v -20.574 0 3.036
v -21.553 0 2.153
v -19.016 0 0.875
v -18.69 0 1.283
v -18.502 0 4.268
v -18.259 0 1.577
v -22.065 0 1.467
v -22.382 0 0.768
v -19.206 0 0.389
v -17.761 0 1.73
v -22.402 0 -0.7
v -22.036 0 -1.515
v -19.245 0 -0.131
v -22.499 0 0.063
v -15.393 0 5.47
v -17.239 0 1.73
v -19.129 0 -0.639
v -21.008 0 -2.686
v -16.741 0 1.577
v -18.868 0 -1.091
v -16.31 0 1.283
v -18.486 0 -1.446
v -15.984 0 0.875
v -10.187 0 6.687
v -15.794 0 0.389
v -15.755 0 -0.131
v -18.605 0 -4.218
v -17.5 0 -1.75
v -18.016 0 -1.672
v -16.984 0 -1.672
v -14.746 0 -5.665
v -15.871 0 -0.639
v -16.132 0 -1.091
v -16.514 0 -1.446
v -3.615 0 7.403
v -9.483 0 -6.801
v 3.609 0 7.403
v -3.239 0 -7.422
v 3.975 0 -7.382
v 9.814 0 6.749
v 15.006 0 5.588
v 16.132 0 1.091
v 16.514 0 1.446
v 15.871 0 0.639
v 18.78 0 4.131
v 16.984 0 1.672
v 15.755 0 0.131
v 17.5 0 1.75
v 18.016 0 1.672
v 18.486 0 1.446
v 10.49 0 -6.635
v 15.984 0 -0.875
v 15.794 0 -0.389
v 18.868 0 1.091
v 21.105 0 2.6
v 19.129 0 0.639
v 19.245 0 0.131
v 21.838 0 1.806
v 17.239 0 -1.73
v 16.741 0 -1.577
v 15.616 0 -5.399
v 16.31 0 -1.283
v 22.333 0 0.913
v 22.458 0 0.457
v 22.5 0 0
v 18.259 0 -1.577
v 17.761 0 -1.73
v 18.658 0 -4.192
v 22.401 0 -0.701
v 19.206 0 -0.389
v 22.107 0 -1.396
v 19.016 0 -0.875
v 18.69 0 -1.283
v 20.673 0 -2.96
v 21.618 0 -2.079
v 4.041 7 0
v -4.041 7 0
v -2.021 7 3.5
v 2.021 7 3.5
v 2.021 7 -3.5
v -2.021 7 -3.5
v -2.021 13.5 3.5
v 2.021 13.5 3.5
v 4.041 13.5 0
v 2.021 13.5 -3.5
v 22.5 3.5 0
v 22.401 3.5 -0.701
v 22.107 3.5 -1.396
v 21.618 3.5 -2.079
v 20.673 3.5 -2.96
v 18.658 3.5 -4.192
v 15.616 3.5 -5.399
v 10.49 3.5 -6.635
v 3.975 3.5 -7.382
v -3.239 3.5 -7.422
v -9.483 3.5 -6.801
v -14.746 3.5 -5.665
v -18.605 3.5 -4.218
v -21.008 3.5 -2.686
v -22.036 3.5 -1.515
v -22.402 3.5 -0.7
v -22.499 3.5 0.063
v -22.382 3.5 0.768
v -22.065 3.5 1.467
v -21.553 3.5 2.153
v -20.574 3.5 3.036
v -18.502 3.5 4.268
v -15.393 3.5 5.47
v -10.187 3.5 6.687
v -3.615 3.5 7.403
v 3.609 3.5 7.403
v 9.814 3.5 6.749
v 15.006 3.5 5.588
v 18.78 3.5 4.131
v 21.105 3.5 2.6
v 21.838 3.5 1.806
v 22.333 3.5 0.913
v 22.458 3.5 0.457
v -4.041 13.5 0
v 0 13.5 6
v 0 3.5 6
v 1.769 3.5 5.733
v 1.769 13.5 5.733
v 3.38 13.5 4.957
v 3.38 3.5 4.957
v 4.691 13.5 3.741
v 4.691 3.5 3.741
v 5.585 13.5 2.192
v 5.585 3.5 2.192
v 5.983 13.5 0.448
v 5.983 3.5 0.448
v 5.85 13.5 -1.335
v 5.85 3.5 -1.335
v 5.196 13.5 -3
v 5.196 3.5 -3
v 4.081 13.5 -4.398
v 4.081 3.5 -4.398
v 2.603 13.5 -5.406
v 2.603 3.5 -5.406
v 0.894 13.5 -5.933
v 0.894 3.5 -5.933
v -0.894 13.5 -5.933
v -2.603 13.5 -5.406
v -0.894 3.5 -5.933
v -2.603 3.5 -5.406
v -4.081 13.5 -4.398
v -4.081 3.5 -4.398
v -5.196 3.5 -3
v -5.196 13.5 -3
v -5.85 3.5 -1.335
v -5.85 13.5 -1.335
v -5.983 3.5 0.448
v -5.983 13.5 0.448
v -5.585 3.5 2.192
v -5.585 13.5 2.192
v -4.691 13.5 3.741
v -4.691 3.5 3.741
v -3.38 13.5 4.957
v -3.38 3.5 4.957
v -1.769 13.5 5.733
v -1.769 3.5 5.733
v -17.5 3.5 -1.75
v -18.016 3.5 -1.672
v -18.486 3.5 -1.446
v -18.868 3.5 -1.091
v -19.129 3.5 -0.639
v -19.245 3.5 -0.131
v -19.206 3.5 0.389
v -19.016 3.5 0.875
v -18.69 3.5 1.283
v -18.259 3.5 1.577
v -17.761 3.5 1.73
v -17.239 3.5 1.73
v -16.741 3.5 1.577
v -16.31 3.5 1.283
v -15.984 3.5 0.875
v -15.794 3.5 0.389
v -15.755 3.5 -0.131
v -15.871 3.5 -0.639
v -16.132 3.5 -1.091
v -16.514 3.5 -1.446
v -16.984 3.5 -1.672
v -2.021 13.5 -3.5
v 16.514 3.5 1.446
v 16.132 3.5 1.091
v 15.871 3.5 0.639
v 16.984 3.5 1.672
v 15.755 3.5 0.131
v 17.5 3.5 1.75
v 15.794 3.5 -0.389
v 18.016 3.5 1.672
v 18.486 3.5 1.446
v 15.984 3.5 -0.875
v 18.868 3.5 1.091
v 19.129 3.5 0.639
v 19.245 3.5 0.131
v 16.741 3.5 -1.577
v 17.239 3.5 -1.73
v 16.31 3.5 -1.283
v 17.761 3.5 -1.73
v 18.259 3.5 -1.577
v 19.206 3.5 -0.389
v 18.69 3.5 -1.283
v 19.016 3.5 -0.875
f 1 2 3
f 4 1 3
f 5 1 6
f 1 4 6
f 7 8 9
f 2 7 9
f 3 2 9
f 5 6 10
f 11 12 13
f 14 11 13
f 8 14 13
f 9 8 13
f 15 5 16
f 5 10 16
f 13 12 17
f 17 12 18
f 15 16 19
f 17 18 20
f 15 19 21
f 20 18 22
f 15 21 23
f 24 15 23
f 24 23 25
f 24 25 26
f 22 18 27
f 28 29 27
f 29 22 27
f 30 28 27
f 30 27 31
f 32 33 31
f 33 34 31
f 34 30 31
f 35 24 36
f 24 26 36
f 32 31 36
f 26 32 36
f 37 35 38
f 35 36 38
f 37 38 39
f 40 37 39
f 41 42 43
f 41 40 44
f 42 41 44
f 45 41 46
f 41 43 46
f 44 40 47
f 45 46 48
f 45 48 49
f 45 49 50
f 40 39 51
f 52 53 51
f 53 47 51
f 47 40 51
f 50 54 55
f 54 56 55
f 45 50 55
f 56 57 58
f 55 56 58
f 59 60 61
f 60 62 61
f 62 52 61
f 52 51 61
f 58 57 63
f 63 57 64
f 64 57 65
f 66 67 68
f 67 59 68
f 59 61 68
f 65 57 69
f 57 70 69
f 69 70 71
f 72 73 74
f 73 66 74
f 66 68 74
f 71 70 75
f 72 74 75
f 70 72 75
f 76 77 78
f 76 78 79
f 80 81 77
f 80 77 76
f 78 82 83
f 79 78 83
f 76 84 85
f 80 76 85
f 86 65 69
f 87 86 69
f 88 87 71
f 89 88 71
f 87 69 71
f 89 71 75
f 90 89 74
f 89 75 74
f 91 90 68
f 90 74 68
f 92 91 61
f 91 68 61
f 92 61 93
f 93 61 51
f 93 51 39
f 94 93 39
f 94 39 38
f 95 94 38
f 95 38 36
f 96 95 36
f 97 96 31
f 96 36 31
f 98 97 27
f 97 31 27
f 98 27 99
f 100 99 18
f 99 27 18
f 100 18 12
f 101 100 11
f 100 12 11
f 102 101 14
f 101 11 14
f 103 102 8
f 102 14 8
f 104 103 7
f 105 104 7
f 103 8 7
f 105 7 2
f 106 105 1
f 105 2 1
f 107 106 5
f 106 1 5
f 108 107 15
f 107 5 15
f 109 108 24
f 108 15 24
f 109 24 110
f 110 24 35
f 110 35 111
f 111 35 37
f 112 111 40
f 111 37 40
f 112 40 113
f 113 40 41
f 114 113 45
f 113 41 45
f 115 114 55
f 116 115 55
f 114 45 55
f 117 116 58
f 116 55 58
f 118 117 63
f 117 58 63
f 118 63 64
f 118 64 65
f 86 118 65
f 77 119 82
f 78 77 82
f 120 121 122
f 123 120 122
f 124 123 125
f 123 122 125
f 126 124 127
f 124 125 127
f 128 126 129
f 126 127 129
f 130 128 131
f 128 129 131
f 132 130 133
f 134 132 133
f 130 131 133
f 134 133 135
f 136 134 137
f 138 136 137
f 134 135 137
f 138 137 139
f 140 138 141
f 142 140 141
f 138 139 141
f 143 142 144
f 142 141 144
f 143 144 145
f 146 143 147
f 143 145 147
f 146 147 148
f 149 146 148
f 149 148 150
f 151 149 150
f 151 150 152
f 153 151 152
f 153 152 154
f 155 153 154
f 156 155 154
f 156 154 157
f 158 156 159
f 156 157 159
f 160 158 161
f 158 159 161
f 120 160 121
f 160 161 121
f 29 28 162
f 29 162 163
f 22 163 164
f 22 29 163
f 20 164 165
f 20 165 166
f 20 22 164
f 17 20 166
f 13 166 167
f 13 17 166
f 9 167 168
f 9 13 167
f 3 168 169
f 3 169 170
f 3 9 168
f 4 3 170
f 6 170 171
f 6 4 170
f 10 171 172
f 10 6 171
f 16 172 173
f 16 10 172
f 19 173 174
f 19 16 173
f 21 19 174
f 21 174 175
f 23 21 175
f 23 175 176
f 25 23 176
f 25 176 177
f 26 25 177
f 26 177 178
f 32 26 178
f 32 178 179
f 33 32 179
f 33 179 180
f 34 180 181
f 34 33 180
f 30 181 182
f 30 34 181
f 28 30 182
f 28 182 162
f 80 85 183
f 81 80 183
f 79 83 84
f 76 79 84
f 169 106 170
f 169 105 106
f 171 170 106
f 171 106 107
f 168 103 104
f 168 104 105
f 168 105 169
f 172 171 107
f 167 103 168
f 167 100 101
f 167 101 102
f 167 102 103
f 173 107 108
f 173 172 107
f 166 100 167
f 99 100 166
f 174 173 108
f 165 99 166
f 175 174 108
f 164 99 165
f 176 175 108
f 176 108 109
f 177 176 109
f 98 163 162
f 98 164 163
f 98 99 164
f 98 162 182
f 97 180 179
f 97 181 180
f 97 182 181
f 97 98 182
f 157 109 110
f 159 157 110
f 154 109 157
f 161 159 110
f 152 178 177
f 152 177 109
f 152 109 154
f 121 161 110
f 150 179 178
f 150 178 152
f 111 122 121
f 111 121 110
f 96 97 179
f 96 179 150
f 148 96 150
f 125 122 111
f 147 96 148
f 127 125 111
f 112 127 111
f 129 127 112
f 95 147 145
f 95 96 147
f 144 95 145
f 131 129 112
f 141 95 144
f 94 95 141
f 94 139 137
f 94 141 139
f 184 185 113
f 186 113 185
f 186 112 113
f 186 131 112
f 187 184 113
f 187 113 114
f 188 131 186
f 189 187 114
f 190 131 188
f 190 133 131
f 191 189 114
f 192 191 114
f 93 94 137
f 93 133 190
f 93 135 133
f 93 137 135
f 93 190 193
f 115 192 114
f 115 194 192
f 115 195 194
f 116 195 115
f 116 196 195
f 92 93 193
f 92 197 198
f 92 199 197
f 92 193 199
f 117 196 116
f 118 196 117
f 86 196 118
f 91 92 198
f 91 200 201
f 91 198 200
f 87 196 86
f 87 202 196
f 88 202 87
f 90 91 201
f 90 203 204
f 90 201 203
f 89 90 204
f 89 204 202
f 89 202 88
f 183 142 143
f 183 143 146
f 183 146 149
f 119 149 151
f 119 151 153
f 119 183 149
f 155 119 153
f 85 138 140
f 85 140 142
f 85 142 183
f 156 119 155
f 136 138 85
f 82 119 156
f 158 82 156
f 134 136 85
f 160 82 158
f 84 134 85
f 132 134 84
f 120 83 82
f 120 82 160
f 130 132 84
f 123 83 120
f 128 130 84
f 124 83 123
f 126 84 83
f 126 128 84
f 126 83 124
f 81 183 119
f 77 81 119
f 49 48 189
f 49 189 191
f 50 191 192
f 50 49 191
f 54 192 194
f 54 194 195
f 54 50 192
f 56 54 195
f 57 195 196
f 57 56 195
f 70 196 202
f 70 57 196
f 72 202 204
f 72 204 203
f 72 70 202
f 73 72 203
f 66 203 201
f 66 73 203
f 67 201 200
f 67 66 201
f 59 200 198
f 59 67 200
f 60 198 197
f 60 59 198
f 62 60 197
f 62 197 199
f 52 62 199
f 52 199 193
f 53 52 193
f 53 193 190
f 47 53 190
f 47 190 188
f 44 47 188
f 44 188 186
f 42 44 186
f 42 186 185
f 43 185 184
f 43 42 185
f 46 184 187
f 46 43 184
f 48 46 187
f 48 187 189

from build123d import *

# Parameters (mm, degrees)
SKETCH2_RX          = 22.5
SKETCH2_RY          = 7.5
SKETCH2_R           = 1.75
BOSS_EXTRUDE3_DEPTH = 3.5
SKETCH3_R           = 6
BOSS_EXTRUDE4_DEPTH = 10
CUT_EXTRUDE1_DEPTH  = 6.5


with BuildPart() as part:
    # Sketch2 → Boss-Extrude3 (new body)
    with BuildSketch(Plane(origin=(0, 0, 0), x_dir=(1, 0, 0), z_dir=(0, 1, 0))):
        with Locations((0, 0)):
            Ellipse(SKETCH2_RX, SKETCH2_RY)
        with Locations(Location((17.5, 0, 0), (0, 0, 270))):
            Circle(SKETCH2_R, mode=Mode.SUBTRACT)
        with Locations(Location((-17.5, 0, 0), (0, 0, 90))):
            Circle(SKETCH2_R, mode=Mode.SUBTRACT)
    extrude(amount=BOSS_EXTRUDE3_DEPTH)

    # Sketch3 → Boss-Extrude4 (add)
    with BuildSketch(Plane(origin=(0, 3.5, 0), x_dir=(1, 0, 0), z_dir=(0, 1, 0))):
        with Locations(Location((0, 0, 0), (0, 0, 270))):
            Circle(SKETCH3_R)
    extrude(amount=BOSS_EXTRUDE4_DEPTH)

    # Sketch4 → Cut-Extrude1 (cut)
    with BuildSketch(Plane(origin=(0, 13.5, 0), x_dir=(1, 0, 0), z_dir=(0, 1, 0))):
        Polygon((2.020725942, -3.5), (4.041451884, 0), (2.020725942, 3.5), (-2.020725942, 3.5), (-4.041451884, 0), (-2.020725942, -3.5), align=None)
    extrude(amount=-CUT_EXTRUDE1_DEPTH, mode=Mode.SUBTRACT)


solid = part.part
